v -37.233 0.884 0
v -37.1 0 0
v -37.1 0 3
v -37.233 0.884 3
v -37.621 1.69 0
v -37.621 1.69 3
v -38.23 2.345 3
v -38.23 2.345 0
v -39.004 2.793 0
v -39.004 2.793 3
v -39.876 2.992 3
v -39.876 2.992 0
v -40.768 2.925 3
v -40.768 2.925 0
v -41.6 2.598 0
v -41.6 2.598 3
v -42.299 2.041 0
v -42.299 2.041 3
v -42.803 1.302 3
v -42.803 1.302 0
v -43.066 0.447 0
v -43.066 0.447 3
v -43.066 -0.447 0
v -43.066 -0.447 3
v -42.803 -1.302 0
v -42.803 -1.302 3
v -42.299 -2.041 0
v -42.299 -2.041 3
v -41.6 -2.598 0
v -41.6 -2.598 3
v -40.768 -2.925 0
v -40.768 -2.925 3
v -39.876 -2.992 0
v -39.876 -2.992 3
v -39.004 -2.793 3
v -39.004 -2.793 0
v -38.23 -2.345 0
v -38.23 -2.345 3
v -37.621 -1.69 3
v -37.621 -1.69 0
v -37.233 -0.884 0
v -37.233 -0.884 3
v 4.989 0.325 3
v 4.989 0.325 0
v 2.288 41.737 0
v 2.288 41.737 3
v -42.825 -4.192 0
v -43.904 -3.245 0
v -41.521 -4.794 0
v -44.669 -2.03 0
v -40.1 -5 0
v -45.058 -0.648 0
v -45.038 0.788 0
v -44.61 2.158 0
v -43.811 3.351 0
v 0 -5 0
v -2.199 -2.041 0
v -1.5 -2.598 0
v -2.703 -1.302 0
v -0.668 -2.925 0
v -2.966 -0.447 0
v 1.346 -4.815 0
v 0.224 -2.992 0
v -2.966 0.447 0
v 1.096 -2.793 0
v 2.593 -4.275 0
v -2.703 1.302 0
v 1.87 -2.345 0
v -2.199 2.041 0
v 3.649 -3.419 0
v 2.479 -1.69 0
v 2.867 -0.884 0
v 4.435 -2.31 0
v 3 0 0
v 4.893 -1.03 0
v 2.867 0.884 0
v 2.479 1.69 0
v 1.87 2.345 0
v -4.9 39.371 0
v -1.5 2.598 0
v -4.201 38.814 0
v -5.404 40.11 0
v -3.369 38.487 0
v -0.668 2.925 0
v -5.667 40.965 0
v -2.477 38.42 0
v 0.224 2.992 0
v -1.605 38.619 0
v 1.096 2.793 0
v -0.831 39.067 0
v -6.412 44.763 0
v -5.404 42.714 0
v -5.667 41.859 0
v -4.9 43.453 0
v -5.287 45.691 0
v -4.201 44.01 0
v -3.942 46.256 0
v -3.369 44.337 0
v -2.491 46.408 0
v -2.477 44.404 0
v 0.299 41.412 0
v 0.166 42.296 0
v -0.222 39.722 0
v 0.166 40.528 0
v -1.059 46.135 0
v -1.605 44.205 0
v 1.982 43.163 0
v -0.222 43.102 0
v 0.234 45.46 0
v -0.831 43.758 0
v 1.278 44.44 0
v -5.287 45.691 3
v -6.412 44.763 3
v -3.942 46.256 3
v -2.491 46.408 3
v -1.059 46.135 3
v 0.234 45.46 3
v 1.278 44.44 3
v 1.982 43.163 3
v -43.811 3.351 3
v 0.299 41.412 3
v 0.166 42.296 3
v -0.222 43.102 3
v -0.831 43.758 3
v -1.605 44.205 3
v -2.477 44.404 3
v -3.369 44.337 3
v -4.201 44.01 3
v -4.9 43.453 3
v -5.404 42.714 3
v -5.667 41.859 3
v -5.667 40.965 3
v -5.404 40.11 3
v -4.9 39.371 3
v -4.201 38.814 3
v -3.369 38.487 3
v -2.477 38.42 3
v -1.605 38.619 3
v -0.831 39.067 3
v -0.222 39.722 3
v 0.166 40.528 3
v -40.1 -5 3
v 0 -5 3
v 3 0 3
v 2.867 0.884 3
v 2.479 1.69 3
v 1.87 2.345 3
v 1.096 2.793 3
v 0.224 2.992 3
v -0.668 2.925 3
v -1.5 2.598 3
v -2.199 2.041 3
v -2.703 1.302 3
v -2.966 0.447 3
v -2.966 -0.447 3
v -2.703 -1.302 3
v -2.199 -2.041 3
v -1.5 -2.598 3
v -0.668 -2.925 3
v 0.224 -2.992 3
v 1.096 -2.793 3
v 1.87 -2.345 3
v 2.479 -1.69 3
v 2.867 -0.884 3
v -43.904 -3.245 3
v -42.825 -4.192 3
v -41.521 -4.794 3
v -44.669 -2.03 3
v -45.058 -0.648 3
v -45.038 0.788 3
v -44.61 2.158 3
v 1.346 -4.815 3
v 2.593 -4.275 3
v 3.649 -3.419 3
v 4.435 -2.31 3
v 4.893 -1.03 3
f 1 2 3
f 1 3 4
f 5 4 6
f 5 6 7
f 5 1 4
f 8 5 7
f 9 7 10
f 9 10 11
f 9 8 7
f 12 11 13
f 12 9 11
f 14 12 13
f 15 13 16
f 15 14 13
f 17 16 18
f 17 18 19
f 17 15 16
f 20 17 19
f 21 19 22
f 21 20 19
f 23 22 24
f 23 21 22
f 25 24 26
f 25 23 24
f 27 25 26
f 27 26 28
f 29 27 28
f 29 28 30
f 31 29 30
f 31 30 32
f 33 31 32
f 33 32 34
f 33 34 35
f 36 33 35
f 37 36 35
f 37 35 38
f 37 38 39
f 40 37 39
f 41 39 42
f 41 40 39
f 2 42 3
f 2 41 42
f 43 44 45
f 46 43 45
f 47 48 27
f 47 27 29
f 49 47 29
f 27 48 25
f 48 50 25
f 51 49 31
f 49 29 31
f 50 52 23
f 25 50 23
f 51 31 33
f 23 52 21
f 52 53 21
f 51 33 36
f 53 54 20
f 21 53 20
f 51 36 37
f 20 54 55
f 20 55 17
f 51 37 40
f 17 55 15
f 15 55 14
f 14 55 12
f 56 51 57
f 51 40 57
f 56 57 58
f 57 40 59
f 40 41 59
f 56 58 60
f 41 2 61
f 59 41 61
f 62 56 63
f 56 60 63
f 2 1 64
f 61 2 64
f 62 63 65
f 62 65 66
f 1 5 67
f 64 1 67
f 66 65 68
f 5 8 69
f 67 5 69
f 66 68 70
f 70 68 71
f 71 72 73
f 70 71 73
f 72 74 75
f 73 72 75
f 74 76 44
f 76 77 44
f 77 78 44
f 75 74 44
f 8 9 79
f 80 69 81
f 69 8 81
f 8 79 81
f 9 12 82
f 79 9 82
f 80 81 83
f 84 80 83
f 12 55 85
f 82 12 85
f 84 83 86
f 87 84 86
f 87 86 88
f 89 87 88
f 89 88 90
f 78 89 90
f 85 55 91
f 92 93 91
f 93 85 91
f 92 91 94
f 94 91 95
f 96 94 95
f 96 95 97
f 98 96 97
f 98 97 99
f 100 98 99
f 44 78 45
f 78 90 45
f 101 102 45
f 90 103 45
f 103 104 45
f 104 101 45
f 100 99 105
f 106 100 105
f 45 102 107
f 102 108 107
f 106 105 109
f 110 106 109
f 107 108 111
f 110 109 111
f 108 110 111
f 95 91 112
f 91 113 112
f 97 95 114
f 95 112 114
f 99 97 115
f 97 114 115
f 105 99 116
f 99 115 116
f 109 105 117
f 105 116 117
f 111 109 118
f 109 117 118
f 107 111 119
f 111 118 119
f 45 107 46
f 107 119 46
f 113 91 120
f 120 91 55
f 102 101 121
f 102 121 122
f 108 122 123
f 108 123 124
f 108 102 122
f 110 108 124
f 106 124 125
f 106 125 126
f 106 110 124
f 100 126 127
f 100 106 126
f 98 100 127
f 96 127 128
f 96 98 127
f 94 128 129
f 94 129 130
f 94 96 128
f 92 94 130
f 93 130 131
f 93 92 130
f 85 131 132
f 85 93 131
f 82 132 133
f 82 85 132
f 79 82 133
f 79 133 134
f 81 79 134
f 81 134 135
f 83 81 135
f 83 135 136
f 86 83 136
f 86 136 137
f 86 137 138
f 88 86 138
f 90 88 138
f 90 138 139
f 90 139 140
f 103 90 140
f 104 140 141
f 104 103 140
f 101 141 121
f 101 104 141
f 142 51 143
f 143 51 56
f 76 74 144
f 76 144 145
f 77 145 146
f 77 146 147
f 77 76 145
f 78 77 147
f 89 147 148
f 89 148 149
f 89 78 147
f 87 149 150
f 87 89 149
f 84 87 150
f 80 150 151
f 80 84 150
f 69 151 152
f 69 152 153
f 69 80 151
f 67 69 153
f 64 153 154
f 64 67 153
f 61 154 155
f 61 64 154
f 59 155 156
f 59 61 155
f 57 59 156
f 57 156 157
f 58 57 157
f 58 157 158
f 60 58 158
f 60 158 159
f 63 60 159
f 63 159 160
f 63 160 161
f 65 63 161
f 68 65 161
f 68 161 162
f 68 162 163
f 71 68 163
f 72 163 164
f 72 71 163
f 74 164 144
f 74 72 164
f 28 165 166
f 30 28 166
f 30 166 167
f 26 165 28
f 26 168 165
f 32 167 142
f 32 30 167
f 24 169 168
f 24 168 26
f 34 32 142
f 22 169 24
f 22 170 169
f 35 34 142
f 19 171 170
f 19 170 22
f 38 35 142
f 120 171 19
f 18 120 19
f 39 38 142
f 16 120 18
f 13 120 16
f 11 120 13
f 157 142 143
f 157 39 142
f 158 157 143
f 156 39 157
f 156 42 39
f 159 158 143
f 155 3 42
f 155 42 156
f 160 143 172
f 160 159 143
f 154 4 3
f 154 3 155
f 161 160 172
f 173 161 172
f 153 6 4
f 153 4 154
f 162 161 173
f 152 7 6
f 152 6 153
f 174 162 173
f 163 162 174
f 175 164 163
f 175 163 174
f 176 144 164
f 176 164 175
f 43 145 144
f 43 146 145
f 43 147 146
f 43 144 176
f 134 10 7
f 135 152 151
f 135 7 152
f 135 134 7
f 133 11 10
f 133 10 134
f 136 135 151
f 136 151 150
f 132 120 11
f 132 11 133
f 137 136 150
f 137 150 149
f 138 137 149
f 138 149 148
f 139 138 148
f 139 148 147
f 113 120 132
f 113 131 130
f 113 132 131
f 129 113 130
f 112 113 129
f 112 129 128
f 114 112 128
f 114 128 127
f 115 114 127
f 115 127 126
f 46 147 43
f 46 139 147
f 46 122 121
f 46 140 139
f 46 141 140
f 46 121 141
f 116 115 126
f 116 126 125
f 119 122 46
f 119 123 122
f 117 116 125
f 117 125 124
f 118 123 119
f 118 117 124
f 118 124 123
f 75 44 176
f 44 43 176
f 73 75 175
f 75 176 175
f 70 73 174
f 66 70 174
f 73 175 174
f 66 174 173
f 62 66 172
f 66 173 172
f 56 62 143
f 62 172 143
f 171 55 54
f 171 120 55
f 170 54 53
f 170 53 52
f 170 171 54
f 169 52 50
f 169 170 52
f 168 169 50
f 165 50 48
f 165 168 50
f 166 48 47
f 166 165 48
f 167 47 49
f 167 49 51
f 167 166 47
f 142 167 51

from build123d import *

# Parameters (mm, degrees)
SKETCH_1_R      = 3
EXTRUDE_1_DEPTH = 3
FILLET_1_R      = 5


with BuildPart() as part:
    # ｽｹｯﾁ1 → ﾎﾞｽ - 押し出し1 (new body)
    with BuildSketch(Plane.XY):
        Polygon((1.518334957, 53.544180062), (-51.352653687, -5), (5.336736491, -5), align=None)
        with Locations((-2.700997506, 41.412010486)):
            Circle(SKETCH_1_R, mode=Mode.SUBTRACT)
        with Locations((-40.1, 0)):
            Circle(SKETCH_1_R, mode=Mode.SUBTRACT)
        Circle(SKETCH_1_R, mode=Mode.SUBTRACT)
    extrude(amount=EXTRUDE_1_DEPTH)

    # ﾌｨﾚｯﾄ1
    fillet_1_edges = [part.edges().sort_by_distance(p)[0] for p in [
        (5.336736491, -5, 1.5),
        (-51.352653687, -5, 1.5),
        (1.518334957, 53.544180062, 1.5),
    ]]
    fillet(fillet_1_edges, radius=FILLET_1_R)


solid = part.part
